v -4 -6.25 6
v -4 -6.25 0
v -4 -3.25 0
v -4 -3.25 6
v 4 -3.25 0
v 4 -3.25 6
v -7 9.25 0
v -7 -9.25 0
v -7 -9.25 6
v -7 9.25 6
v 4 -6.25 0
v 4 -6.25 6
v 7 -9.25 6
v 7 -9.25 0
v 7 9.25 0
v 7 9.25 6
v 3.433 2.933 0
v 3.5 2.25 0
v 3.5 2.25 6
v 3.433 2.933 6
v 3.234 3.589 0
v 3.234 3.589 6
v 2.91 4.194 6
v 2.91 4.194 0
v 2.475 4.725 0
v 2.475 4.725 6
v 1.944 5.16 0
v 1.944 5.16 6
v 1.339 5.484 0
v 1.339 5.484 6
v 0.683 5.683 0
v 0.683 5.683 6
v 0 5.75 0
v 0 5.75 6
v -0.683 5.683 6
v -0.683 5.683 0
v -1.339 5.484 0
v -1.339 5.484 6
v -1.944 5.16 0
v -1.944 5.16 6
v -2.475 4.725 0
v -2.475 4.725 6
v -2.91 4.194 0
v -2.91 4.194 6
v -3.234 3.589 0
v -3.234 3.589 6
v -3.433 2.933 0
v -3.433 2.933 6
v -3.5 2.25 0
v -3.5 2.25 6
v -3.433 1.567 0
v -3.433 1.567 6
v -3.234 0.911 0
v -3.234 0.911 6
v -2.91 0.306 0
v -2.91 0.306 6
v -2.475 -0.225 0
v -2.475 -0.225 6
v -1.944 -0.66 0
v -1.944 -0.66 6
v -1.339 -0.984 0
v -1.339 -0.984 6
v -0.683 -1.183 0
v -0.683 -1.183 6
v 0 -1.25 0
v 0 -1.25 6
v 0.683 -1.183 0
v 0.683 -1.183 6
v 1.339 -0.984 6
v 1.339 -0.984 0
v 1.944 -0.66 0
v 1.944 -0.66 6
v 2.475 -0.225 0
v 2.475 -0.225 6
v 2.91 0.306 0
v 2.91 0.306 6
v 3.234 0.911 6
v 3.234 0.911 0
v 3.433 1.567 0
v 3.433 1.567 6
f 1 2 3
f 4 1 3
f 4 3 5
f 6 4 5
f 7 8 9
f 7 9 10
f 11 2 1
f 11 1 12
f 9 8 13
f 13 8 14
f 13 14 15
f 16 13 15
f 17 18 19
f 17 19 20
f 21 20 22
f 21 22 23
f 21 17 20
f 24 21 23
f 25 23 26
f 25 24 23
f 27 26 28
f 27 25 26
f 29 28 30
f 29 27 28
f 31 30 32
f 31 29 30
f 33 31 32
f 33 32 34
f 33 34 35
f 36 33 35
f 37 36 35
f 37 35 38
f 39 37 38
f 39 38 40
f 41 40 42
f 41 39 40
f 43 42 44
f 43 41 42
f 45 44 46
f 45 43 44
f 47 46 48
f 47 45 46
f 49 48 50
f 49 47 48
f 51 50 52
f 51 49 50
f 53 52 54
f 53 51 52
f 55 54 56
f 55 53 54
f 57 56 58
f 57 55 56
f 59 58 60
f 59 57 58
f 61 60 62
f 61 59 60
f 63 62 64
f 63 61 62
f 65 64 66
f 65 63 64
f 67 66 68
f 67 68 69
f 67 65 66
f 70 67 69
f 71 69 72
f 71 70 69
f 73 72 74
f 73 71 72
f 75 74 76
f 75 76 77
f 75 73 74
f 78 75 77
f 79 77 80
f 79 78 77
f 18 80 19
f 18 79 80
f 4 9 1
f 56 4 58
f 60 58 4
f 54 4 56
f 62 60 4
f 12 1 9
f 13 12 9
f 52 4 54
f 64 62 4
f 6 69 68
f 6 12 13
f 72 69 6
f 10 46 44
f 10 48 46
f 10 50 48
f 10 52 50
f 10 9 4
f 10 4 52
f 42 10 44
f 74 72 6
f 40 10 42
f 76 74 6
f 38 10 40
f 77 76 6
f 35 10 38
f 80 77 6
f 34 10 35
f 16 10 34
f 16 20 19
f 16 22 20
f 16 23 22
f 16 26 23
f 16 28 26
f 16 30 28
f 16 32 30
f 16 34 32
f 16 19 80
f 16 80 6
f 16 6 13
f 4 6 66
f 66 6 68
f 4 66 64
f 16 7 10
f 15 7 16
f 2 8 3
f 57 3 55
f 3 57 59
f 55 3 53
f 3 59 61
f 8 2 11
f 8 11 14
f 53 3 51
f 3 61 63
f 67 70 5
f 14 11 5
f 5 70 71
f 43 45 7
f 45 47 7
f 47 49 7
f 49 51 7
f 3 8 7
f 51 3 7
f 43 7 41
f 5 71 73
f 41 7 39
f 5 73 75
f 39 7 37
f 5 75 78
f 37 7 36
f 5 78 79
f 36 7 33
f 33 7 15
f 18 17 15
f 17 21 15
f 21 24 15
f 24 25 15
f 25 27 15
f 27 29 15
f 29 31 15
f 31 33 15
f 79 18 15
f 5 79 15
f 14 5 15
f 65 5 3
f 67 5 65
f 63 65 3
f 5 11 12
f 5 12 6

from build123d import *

# Parameters (mm, degrees)
SKETCH1_W           = 14
SKETCH1_H           = 18.5
SKETCH1_R           = 3.5
SKETCH1_W_2         = 8
SKETCH1_H_2         = 3
BOSS_EXTRUDE1_DEPTH = 6


with BuildPart() as part:
    # Sketch1 → Boss-Extrude1 (new body)
    with BuildSketch(Plane.XY):
        Rectangle(SKETCH1_W, SKETCH1_H)
        with Locations((0, 2.25)):
            Circle(SKETCH1_R, mode=Mode.SUBTRACT)
        with Locations((0, -4.75)):
            Rectangle(SKETCH1_W_2, SKETCH1_H_2, mode=Mode.SUBTRACT)
    extrude(amount=BOSS_EXTRUDE1_DEPTH)


solid = part.part
